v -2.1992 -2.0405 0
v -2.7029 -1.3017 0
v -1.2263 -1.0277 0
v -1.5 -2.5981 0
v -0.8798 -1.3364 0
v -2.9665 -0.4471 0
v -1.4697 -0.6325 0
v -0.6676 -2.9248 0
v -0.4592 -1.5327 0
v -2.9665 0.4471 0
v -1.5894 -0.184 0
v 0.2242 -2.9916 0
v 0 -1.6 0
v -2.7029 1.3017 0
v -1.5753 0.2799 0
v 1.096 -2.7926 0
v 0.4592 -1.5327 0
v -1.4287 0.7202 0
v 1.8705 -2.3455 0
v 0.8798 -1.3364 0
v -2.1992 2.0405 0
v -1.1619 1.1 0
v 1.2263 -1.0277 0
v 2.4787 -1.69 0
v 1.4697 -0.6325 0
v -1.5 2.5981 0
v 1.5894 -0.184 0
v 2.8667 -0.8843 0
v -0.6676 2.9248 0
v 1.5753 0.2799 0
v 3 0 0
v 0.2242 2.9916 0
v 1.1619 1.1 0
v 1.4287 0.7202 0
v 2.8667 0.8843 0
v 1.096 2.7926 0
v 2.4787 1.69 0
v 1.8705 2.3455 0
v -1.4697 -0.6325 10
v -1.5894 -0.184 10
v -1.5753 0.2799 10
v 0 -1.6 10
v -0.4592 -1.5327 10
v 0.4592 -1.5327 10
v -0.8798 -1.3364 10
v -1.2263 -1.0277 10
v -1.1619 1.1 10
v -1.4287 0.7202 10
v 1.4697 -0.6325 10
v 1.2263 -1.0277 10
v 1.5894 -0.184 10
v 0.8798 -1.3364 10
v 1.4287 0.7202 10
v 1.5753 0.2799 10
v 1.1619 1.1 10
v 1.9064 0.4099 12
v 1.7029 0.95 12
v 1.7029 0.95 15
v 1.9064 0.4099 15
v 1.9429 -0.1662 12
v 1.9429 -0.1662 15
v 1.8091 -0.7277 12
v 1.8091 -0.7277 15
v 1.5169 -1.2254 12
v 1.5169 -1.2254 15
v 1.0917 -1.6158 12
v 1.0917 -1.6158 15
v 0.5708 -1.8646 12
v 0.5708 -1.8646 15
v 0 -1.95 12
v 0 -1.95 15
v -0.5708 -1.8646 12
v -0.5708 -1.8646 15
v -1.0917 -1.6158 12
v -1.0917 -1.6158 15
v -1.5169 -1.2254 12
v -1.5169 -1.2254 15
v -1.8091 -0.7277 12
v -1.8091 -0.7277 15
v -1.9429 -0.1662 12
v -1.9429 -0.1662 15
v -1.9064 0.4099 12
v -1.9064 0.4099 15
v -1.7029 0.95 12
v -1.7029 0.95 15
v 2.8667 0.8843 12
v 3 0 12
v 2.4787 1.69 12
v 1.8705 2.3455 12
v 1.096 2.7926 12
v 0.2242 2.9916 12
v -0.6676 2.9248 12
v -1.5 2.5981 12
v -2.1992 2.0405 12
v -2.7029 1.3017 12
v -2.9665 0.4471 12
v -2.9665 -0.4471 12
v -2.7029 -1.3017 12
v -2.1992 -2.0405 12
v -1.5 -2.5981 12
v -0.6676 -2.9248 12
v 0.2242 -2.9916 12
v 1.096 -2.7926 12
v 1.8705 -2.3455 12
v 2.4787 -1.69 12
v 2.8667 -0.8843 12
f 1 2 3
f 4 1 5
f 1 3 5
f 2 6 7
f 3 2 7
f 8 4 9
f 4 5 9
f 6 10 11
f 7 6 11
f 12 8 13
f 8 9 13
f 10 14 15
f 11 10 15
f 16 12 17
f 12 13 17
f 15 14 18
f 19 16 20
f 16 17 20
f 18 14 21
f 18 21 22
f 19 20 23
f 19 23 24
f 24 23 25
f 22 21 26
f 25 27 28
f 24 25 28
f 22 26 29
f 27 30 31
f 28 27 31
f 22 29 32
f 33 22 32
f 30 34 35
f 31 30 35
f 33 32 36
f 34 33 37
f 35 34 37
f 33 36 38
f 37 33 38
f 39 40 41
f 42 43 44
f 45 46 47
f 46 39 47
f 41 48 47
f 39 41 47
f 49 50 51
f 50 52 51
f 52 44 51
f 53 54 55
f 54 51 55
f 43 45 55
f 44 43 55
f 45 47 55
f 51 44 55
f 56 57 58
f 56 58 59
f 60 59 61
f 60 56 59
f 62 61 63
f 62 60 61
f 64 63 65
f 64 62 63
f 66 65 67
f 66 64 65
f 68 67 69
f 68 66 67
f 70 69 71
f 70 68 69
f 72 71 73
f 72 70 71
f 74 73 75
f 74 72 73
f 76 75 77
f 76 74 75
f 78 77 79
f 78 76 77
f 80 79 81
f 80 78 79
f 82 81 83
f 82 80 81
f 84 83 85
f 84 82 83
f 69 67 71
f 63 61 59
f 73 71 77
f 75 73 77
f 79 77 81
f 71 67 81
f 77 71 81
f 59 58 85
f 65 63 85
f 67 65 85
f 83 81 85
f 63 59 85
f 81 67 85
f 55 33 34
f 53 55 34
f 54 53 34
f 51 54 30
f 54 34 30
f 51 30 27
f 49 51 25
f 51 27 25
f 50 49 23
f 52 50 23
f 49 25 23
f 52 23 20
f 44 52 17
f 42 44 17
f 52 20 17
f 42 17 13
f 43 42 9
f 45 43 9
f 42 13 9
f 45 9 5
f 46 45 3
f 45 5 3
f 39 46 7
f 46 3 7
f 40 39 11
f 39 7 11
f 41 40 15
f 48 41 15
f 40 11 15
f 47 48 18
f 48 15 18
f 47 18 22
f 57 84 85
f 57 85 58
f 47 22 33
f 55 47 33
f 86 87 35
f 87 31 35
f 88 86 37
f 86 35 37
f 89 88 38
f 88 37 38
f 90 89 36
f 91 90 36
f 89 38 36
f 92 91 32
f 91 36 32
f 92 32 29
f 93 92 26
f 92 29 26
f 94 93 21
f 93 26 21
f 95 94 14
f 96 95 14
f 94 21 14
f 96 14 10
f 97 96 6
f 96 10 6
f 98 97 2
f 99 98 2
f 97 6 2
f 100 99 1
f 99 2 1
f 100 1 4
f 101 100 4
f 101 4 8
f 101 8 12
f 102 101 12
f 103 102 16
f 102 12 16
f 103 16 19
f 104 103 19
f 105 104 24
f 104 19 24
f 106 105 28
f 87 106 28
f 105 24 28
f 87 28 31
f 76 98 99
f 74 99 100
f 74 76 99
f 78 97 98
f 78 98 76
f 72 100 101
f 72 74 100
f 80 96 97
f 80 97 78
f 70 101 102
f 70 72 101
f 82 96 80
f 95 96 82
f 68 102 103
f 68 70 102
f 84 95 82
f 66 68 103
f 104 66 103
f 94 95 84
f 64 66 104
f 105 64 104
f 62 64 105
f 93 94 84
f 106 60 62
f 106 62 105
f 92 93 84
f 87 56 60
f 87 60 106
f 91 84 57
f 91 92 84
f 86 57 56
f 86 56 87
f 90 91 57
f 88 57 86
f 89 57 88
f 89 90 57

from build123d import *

# Parameters (mm, degrees)
SKETCH1_R           = 3
BOSS_EXTRUDE1_DEPTH = 10
SKETCH2_R           = 3
BOSS_EXTRUDE2_DEPTH = 2
BOSS_EXTRUDE3_DEPTH = 3


with BuildPart() as part:
    # Sketch1 → Boss-Extrude1 (new body)
    with BuildSketch(Plane.XY):
        Circle(SKETCH1_R)
        with BuildLine():
            Line((-1.161895004, 1.1), (1.161895004, 1.1))
            ThreePointArc((1.161895004, 1.1), (0, -1.6), (-1.161895004, 1.1))
        make_face(mode=Mode.SUBTRACT)
    extrude(amount=BOSS_EXTRUDE1_DEPTH)

    # Sketch2 → Boss-Extrude2 (add)
    with BuildSketch(Plane.XY.offset(10)):
        Circle(SKETCH2_R)
    extrude(amount=BOSS_EXTRUDE2_DEPTH)

    # Sketch3 → Boss-Extrude3 (add)
    with BuildSketch(Plane.XY.offset(12)):
        with BuildLine():
            Line((-1.702938637, 0.95), (1.702938637, 0.95))
            ThreePointArc((1.702938637, 0.95), (0, -1.95), (-1.702938637, 0.95))
        make_face()
    extrude(amount=BOSS_EXTRUDE3_DEPTH)


solid = part.part
